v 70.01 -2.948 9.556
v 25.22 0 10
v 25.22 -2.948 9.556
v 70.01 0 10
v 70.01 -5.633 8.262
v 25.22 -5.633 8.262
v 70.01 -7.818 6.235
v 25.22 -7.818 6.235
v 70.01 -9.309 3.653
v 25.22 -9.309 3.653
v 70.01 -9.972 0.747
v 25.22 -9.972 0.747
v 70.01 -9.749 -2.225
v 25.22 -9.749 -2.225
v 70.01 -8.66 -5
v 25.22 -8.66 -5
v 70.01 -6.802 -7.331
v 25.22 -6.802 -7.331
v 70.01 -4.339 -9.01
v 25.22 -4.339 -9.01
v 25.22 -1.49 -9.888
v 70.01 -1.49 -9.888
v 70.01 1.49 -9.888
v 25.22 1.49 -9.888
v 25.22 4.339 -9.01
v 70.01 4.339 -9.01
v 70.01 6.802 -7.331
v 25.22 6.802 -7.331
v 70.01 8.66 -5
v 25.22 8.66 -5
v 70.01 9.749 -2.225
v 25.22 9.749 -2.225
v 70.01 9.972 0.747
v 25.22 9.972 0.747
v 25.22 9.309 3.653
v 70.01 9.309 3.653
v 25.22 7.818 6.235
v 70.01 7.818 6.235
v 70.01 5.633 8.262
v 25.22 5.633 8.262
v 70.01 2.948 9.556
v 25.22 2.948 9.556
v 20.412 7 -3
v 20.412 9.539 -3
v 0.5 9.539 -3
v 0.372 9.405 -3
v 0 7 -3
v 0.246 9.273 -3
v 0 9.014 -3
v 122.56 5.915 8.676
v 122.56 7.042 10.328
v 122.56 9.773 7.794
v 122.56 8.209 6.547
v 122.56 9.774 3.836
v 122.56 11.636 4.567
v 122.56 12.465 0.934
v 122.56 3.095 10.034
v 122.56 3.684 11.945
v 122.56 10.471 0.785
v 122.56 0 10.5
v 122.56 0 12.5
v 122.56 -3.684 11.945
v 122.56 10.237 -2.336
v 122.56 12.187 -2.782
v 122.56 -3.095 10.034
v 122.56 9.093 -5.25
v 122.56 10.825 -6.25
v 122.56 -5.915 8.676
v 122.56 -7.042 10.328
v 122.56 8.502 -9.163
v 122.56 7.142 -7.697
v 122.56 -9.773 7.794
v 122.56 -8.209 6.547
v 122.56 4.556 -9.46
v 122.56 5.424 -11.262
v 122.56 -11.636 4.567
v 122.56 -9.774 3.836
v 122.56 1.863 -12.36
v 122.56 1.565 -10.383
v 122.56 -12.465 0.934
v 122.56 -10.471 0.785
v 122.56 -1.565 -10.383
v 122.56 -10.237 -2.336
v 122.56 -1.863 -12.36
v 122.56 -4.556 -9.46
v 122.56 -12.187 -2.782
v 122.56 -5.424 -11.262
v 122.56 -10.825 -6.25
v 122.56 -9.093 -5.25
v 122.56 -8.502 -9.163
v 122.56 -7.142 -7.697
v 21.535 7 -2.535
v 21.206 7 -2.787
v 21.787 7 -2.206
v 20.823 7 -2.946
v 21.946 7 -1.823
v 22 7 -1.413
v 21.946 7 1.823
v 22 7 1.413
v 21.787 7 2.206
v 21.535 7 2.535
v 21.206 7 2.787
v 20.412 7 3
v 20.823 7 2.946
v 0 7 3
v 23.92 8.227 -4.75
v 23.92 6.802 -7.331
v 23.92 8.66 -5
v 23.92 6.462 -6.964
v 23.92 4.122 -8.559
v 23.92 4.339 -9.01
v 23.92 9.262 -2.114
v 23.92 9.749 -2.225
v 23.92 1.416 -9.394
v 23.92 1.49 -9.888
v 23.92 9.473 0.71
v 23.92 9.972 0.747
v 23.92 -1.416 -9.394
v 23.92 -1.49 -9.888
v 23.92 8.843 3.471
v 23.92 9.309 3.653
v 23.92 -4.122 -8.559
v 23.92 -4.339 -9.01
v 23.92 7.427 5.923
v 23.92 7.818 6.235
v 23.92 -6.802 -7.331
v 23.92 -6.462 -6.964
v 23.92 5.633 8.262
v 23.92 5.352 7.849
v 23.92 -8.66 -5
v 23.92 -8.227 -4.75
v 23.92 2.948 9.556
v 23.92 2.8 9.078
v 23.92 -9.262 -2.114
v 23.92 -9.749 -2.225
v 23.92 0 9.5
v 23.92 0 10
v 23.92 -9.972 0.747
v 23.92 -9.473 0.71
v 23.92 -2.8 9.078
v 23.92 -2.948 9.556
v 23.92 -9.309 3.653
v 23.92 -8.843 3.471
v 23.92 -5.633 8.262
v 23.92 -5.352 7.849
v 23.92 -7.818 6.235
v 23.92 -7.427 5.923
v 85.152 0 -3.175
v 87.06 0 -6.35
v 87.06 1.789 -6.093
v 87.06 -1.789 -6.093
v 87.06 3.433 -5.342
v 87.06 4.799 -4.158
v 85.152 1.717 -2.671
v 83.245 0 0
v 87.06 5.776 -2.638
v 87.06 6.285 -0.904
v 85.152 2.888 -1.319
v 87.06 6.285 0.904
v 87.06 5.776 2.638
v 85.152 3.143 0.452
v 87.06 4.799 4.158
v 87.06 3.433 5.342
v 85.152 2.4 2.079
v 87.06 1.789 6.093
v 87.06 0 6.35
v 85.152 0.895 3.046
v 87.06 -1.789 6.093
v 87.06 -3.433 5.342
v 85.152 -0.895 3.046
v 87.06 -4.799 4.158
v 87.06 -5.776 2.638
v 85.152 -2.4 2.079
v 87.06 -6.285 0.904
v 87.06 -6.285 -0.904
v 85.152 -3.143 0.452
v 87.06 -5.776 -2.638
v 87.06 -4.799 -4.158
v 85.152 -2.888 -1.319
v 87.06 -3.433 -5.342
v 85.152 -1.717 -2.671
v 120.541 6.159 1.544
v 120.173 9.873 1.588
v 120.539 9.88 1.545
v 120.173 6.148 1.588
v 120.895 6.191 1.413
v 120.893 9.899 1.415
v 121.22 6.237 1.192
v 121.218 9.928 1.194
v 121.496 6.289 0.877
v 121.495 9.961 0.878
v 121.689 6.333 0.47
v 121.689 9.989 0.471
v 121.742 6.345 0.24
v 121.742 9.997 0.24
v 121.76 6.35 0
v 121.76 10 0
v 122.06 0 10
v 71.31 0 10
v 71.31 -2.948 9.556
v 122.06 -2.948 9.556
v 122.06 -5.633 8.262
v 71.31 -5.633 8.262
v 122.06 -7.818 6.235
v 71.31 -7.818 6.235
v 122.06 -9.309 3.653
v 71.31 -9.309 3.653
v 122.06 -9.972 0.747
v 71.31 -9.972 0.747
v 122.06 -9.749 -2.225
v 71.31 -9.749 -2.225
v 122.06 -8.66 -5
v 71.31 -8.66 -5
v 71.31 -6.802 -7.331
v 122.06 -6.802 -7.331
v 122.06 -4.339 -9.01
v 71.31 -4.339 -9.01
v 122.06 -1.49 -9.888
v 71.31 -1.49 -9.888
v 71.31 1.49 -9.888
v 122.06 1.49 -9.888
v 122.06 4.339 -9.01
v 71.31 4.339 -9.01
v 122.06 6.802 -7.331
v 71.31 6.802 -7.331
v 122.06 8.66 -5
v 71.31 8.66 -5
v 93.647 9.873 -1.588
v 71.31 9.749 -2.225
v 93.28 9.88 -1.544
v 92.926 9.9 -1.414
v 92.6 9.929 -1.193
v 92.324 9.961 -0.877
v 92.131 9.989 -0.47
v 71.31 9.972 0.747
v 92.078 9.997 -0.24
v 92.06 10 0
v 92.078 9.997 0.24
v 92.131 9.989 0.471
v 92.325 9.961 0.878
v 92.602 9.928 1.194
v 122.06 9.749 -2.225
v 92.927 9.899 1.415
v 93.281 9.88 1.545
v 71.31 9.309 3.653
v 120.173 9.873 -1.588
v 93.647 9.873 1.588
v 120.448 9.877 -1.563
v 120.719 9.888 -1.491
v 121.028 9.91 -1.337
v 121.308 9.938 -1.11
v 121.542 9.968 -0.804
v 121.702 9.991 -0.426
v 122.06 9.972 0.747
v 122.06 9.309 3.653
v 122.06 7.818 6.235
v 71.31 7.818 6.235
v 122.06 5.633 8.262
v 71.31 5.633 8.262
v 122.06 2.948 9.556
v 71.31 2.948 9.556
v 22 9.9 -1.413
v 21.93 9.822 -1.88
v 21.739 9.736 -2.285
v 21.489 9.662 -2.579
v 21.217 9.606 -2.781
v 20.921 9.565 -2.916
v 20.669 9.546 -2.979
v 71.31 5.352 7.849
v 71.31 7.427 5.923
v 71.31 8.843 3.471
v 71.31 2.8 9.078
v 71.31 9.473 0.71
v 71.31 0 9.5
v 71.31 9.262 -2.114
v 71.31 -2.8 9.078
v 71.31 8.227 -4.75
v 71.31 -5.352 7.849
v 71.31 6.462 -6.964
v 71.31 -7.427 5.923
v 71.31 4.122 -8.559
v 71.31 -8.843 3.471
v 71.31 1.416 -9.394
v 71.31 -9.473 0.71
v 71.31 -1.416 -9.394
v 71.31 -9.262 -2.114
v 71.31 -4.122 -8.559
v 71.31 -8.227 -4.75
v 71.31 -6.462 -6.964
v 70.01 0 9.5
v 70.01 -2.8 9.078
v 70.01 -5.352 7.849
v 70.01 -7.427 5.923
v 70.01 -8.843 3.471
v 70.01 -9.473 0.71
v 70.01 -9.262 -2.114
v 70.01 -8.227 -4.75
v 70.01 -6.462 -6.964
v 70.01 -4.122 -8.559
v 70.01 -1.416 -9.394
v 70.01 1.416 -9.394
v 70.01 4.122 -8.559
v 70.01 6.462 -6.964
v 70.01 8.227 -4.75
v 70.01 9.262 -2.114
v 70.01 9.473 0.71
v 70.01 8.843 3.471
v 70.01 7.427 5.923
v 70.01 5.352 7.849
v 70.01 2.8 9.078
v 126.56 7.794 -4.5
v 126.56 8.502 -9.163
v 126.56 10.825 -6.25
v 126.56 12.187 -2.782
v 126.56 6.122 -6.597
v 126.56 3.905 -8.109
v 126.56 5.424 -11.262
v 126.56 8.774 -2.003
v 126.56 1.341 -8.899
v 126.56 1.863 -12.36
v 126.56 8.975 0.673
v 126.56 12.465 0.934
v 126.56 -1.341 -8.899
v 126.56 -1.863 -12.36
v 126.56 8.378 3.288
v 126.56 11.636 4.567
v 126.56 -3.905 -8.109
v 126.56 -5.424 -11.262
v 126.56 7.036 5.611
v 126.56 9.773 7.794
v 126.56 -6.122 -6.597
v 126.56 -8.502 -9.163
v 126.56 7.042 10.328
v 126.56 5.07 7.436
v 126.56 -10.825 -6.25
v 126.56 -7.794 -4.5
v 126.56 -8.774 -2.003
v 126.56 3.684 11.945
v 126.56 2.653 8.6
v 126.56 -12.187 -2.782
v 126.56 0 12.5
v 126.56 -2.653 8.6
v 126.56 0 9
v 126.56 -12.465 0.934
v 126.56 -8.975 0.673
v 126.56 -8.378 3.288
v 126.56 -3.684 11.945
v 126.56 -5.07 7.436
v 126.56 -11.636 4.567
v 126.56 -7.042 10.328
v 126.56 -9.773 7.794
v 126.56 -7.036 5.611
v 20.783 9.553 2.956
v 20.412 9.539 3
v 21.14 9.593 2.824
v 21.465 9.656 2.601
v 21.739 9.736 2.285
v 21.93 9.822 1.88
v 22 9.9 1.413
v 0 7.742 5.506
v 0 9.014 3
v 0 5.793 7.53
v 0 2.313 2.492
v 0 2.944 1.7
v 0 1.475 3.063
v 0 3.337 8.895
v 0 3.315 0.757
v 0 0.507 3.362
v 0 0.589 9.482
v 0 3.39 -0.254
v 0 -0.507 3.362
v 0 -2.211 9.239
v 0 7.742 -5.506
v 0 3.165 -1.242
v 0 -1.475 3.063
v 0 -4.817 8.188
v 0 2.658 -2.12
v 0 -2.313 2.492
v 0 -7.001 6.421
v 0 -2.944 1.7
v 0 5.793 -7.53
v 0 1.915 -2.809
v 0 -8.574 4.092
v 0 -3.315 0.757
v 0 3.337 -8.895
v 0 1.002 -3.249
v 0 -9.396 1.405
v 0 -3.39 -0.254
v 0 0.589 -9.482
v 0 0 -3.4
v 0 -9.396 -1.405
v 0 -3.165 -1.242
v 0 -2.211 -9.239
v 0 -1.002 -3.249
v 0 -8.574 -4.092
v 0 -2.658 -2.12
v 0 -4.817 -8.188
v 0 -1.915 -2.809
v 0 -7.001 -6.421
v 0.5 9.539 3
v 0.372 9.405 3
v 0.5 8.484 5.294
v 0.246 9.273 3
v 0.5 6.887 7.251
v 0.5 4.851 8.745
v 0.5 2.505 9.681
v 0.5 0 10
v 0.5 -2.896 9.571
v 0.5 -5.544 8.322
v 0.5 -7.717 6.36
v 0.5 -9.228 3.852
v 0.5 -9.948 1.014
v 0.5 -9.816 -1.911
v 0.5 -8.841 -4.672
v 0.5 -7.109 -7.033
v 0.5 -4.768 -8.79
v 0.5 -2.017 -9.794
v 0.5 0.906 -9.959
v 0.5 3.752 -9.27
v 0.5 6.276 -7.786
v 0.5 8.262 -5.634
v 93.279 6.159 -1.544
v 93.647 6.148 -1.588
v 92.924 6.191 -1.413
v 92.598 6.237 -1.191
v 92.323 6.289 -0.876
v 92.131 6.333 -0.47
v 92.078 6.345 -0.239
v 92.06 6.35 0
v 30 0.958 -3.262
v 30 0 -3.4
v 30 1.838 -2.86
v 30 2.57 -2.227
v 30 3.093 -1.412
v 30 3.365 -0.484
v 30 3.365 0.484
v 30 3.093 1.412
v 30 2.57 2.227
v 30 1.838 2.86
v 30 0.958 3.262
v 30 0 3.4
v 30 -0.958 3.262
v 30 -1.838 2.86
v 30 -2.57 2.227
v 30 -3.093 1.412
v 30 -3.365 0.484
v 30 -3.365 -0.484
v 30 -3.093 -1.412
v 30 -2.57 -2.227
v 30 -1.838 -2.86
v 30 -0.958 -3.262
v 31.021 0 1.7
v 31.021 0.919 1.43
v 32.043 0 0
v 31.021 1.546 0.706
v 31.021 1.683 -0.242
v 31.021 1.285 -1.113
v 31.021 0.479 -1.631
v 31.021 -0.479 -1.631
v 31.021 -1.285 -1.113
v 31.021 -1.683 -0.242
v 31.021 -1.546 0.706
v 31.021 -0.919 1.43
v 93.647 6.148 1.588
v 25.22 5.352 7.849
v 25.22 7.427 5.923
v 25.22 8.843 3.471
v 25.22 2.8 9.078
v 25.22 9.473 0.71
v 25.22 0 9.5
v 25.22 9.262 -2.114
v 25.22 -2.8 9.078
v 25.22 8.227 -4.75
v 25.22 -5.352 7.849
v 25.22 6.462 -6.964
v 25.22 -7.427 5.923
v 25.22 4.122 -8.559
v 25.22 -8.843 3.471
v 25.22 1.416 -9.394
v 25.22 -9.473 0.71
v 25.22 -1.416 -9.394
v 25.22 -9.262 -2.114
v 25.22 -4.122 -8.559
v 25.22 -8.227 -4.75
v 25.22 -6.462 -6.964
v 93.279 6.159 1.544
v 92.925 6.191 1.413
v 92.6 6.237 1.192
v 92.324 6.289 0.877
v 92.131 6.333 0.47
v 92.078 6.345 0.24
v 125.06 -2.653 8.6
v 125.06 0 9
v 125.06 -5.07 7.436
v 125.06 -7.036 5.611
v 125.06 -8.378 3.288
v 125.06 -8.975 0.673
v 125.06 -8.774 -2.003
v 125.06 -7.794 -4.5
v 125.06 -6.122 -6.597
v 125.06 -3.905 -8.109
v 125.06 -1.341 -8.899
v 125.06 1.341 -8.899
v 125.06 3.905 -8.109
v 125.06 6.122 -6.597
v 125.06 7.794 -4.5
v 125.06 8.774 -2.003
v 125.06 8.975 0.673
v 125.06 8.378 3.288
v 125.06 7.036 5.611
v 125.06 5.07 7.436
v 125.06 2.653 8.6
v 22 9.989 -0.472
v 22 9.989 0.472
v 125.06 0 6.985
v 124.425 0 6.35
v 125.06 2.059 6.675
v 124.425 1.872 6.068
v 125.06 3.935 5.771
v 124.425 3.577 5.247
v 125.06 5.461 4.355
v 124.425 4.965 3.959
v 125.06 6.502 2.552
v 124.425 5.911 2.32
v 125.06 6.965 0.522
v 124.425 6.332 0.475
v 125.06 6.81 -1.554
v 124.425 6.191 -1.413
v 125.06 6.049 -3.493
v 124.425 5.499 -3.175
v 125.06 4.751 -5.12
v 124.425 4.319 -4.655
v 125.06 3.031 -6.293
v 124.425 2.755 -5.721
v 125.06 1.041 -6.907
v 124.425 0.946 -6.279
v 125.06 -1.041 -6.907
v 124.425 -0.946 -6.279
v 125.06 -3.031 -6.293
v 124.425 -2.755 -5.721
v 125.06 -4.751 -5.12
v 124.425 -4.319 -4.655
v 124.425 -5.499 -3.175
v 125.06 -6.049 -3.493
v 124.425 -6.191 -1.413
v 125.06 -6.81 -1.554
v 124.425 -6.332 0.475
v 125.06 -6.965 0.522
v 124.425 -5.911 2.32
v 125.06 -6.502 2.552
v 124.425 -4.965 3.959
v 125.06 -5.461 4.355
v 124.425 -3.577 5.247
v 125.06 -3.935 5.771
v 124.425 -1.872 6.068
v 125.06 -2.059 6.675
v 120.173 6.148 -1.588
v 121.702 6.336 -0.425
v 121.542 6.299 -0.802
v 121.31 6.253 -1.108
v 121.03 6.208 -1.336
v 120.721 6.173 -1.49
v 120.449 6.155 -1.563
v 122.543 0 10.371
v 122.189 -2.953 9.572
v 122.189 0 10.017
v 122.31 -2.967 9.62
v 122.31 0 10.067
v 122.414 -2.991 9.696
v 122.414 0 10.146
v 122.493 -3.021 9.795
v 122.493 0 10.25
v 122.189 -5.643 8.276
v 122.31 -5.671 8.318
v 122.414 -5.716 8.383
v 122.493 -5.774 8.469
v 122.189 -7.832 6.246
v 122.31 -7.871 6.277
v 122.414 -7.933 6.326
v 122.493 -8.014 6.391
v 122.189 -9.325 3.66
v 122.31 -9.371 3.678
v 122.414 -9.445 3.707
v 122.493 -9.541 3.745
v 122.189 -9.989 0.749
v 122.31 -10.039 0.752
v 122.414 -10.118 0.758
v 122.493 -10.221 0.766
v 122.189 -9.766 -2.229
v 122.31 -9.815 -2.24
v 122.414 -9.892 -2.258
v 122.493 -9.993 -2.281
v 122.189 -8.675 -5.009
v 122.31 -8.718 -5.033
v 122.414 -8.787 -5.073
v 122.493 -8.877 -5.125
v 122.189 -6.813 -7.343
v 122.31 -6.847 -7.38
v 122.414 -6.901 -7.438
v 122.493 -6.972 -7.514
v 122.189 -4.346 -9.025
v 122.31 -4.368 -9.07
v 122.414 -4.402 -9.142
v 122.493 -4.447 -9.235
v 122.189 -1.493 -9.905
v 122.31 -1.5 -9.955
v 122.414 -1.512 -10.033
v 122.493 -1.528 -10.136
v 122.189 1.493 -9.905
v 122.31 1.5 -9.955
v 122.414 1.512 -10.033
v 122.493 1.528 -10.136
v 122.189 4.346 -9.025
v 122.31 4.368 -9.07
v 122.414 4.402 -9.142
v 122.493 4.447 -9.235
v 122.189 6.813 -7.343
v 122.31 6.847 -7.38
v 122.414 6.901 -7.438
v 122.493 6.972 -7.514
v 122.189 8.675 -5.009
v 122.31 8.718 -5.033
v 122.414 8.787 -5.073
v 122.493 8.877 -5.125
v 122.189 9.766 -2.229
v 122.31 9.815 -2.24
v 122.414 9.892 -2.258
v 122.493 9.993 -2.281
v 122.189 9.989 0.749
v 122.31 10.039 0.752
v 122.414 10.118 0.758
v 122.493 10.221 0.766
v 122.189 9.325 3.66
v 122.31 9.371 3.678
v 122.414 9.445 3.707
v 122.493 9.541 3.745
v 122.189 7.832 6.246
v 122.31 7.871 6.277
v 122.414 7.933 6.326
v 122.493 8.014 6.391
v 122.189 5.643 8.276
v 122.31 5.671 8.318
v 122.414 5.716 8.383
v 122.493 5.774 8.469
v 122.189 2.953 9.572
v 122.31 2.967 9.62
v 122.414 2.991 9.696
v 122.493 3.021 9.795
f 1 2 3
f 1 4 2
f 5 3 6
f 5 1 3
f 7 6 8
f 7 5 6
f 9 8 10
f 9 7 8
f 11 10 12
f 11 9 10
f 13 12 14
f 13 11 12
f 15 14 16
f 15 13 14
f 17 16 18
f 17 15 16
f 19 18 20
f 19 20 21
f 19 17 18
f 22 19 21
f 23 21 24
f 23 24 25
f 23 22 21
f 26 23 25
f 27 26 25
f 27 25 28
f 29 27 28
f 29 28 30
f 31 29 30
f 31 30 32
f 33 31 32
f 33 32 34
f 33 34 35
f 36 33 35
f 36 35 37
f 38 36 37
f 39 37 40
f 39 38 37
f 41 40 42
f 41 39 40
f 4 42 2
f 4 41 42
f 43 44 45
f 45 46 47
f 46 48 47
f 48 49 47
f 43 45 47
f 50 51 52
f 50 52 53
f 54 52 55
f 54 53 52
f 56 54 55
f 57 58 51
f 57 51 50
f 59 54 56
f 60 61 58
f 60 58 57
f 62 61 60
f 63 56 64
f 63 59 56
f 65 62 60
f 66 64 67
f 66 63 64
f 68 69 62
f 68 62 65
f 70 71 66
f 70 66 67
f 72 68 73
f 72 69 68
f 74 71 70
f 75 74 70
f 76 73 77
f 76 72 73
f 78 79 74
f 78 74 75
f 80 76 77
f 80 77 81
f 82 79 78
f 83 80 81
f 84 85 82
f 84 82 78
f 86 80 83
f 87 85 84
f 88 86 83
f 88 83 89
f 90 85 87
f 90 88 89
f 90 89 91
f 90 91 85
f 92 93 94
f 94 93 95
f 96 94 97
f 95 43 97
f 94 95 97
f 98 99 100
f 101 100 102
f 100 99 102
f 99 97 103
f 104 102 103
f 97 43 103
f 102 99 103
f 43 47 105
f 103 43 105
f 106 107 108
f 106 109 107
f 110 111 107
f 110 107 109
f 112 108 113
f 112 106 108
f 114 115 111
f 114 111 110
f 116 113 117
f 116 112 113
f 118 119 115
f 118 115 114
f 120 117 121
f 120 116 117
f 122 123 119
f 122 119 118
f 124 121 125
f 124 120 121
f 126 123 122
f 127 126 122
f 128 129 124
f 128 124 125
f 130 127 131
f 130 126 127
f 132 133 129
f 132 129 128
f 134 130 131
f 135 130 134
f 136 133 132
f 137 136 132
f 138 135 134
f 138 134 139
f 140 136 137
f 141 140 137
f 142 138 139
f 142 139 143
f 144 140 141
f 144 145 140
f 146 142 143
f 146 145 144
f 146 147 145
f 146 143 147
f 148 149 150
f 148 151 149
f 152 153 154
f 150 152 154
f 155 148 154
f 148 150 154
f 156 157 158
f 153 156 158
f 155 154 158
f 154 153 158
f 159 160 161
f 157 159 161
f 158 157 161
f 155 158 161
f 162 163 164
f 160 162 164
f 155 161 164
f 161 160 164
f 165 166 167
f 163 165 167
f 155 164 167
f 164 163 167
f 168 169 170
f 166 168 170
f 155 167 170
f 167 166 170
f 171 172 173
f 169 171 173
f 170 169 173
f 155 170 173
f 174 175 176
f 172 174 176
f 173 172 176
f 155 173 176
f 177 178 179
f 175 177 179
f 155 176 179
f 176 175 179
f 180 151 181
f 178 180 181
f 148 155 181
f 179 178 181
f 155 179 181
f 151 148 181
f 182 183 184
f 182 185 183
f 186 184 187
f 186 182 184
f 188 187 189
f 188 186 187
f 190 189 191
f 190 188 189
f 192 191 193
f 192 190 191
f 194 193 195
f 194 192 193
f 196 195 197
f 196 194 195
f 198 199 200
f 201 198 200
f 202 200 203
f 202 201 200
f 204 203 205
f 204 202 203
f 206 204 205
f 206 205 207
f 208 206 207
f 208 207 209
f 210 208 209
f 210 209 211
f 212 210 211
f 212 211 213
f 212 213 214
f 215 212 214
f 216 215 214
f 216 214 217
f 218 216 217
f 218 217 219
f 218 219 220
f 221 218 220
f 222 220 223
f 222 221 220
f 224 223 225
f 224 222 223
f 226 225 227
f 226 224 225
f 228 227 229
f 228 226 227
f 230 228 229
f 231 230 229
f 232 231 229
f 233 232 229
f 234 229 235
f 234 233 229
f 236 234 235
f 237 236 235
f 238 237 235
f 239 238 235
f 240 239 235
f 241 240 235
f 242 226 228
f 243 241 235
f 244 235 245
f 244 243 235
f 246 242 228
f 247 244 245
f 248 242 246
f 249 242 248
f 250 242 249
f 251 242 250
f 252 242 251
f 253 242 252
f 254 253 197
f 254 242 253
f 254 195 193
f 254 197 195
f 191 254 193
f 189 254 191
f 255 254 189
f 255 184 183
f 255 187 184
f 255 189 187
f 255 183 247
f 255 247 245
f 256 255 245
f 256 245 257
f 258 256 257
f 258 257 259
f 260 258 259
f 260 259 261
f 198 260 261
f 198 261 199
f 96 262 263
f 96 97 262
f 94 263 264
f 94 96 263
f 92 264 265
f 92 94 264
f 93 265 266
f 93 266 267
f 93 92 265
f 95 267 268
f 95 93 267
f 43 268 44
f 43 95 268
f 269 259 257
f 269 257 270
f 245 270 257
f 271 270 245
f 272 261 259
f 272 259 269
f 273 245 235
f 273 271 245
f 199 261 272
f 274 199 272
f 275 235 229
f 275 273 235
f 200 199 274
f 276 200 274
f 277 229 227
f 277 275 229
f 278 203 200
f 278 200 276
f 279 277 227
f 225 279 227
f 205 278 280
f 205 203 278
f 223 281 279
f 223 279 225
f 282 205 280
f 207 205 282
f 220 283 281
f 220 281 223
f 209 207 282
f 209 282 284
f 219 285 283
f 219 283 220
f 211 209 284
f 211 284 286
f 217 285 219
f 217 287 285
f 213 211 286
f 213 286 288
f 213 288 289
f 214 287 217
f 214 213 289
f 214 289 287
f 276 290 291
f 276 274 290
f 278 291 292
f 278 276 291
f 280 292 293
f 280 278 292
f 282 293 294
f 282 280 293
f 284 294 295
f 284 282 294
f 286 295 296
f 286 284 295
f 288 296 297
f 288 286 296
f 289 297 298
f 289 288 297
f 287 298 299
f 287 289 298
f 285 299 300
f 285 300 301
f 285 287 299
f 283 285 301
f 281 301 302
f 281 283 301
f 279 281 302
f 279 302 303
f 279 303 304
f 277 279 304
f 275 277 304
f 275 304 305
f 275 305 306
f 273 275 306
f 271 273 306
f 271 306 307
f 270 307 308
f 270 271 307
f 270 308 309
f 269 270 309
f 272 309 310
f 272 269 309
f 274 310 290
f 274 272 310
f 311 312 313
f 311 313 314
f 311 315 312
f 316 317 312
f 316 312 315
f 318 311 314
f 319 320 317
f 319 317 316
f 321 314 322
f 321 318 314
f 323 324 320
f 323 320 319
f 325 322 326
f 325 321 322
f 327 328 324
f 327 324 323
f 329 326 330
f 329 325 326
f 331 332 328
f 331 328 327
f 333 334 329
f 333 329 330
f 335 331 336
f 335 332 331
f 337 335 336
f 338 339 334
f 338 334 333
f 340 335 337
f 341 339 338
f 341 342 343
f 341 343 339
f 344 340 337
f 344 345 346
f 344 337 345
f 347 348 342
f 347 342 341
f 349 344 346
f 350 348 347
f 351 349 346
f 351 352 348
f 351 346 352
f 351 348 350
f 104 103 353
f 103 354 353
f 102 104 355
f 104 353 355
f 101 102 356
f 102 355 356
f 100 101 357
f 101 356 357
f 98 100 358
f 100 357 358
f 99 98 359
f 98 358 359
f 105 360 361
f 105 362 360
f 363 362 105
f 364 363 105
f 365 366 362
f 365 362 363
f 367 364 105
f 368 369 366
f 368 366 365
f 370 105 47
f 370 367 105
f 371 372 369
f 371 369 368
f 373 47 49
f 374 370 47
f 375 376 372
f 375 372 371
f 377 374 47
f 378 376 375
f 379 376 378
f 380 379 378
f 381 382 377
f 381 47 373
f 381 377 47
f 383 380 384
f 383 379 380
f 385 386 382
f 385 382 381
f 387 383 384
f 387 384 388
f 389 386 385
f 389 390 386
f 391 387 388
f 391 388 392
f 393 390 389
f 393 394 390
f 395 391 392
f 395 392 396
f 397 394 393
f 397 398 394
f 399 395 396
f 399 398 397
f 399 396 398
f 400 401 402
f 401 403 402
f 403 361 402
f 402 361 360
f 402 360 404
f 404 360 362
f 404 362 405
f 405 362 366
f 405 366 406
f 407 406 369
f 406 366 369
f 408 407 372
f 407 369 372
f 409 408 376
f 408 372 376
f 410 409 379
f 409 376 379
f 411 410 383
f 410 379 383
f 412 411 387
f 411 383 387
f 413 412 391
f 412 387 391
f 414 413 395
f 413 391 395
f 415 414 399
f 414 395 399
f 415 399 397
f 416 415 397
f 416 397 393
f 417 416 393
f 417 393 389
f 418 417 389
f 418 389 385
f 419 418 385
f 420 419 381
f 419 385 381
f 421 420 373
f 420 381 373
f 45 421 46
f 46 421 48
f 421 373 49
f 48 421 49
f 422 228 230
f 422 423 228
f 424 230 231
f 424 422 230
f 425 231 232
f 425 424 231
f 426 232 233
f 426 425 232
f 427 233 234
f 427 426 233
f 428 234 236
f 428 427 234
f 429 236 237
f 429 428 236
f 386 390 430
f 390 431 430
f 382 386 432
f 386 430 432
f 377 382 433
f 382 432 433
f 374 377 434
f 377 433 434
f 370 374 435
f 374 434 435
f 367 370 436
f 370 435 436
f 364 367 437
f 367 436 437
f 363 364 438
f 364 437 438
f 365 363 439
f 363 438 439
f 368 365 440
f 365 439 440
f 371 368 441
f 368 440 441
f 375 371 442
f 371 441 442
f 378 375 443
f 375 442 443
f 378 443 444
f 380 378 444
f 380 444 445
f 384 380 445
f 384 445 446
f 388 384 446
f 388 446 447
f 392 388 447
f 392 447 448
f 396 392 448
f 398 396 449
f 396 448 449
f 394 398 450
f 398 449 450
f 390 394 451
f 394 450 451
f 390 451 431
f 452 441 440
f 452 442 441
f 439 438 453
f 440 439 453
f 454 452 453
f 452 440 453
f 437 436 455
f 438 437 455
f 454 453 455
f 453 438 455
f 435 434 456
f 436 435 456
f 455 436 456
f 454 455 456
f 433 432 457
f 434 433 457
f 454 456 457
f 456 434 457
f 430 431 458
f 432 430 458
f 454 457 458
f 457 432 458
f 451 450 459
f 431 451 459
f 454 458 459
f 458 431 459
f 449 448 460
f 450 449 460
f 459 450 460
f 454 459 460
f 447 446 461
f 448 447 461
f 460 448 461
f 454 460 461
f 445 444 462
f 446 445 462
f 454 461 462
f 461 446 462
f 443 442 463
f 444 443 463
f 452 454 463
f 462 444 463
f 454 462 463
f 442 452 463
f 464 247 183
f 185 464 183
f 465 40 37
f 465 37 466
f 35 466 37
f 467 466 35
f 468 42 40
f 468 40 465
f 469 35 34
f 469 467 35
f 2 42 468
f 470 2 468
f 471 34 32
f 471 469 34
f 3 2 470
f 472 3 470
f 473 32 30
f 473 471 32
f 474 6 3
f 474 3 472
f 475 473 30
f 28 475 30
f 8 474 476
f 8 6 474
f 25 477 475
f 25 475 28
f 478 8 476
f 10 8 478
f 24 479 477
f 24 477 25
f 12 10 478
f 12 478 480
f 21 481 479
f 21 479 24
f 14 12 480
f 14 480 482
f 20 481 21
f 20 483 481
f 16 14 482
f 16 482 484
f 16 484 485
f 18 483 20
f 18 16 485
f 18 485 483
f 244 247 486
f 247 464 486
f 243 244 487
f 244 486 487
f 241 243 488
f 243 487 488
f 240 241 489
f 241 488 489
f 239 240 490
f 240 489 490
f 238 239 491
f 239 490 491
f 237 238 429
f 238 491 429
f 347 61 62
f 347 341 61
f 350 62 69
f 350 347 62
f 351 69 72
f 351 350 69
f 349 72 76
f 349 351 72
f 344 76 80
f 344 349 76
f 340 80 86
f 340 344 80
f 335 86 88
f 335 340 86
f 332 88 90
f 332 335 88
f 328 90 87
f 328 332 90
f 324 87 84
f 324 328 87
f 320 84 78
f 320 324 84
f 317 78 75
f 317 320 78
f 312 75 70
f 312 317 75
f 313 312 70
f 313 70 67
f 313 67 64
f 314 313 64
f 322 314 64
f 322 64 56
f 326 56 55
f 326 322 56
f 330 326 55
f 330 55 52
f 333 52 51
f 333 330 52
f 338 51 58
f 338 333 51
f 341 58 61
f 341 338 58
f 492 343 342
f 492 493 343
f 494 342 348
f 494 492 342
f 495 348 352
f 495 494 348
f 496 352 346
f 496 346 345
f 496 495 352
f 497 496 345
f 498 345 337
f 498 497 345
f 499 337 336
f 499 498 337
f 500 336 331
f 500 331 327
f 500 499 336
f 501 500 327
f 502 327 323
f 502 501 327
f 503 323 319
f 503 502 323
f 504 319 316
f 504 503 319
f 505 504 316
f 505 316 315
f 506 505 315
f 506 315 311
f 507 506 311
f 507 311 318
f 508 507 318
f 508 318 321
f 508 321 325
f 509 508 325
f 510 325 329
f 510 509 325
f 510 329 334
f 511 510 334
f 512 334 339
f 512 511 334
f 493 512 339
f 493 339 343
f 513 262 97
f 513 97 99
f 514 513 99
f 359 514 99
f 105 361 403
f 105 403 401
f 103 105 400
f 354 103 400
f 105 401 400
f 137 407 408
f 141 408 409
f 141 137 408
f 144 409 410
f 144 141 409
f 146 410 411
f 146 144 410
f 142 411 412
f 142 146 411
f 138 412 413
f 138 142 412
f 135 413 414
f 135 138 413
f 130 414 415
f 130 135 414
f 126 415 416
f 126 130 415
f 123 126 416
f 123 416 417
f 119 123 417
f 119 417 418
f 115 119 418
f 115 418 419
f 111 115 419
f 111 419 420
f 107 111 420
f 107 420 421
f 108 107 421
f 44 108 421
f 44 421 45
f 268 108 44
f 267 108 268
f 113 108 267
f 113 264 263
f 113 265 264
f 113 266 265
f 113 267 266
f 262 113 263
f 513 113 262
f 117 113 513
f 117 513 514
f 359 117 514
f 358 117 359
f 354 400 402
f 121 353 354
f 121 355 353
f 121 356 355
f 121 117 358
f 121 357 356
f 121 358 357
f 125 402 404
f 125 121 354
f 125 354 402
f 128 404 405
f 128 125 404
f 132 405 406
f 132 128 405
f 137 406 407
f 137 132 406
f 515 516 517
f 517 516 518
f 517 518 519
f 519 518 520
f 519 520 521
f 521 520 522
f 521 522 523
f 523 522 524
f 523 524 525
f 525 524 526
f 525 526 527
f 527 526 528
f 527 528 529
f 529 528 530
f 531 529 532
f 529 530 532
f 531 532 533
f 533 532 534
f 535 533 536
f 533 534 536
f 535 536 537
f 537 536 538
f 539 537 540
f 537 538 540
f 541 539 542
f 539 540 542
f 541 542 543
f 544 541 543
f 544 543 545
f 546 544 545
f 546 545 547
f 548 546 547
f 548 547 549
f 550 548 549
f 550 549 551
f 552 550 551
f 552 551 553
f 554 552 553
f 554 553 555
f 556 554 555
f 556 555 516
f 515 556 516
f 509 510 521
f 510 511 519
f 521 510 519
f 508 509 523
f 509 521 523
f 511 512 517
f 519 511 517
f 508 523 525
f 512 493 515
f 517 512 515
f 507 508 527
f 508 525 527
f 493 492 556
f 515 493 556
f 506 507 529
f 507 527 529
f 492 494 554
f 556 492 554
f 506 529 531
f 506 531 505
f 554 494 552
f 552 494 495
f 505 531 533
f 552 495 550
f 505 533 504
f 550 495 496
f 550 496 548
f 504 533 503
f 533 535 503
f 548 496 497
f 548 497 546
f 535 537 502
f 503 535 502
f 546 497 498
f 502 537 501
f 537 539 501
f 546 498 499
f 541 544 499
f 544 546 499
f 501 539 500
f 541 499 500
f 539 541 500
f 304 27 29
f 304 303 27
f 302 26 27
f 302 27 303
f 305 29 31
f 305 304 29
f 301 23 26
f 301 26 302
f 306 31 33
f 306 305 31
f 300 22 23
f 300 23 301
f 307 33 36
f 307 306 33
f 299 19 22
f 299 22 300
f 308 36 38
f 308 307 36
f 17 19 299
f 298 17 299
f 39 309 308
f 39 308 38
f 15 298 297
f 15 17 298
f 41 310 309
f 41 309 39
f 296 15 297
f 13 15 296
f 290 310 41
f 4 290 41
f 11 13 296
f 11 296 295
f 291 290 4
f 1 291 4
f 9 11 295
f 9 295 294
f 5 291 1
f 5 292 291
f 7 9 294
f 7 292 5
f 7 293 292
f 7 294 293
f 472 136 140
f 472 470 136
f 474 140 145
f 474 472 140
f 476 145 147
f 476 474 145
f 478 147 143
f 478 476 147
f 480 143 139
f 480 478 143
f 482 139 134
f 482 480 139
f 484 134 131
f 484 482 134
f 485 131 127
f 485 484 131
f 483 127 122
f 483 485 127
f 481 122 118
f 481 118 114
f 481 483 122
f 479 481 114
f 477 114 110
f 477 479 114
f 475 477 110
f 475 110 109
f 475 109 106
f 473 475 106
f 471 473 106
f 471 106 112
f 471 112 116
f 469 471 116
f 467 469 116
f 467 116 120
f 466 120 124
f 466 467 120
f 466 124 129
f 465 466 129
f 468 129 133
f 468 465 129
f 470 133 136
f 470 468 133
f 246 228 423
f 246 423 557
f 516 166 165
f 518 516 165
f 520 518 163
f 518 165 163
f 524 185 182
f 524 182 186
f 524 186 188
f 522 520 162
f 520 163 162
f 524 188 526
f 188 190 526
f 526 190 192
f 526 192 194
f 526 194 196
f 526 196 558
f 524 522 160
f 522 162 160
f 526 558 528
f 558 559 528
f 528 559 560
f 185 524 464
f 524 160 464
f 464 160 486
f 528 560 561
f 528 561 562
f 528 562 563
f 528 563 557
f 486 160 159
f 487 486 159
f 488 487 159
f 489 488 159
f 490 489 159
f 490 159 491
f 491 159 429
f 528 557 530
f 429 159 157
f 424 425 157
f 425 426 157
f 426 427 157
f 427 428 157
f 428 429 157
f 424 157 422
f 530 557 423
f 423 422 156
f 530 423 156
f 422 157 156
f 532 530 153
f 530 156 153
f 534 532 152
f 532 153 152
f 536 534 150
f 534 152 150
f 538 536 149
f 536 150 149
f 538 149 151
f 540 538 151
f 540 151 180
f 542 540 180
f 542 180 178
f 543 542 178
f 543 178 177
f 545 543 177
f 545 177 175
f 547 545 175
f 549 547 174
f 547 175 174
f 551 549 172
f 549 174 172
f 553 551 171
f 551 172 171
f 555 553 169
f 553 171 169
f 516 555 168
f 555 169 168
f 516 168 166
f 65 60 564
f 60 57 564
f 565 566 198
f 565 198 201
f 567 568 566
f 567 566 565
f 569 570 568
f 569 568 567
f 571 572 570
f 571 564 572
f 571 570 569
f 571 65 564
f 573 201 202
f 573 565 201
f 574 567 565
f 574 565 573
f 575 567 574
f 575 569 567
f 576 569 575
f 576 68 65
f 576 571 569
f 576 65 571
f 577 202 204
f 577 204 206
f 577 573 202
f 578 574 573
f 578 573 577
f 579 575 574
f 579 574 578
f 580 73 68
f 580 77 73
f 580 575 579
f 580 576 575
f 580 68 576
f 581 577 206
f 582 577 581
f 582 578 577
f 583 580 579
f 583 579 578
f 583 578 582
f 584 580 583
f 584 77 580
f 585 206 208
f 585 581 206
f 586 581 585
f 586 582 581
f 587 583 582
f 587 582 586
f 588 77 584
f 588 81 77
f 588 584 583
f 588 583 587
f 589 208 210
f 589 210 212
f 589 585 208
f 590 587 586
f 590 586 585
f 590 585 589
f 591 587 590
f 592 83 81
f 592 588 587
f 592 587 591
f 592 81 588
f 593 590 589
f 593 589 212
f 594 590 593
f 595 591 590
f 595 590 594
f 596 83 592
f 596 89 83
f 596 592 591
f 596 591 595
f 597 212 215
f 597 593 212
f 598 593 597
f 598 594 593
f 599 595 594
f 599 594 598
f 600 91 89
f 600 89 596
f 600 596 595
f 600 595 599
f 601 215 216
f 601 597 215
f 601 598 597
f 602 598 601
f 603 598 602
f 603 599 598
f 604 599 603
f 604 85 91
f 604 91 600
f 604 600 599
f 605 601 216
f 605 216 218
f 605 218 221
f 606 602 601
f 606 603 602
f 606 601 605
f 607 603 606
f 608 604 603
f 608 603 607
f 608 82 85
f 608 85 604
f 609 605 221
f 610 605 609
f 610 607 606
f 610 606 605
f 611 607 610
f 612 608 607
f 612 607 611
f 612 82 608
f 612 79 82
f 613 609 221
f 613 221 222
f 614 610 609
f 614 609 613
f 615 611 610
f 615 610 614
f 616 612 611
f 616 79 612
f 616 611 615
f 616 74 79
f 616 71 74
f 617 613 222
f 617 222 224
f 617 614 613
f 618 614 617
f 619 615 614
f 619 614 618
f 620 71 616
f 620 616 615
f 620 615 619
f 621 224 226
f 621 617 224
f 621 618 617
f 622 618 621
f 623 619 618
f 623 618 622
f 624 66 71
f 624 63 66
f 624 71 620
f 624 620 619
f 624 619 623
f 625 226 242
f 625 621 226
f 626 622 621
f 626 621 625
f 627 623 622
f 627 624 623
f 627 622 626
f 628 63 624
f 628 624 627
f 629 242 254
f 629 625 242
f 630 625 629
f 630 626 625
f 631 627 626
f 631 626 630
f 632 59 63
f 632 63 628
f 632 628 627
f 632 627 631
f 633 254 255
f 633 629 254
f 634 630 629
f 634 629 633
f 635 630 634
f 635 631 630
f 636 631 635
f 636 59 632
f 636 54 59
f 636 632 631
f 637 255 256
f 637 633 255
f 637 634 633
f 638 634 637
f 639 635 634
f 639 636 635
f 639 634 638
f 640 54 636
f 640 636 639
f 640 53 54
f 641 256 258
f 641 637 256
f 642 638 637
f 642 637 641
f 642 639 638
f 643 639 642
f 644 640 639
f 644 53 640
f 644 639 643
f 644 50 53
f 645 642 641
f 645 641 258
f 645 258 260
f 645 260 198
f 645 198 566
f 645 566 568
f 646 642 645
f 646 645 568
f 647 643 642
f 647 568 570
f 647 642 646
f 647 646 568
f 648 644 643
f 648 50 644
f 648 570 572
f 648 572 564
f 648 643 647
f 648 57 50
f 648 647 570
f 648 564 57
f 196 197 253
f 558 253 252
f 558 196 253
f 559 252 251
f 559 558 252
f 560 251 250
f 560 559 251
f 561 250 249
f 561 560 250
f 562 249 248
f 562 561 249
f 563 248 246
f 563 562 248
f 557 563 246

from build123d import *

# Parameters (mm, degrees)
F_1_2_0_5_DIAMETER_HOLE1_D           = 12.7
F_1_2_0_5_DIAMETER_HOLE1_DEPTH       = 38
F_1_2_0_5_DIAMETER_HOLE1_CSINK_D     = 13.97
F_1_2_0_5_DIAMETER_HOLE1_CSINK_ANGLE = 90
F_1_2_0_5_DIAMETER_HOLE1_TIP         = 3.815464931
FILLET1_R                            = 0.5
CUT_EXTRUDE2_DEPTH                   = 22
FILLET2_R                            = 1.5875
CHAMFER2_SIZE                        = 0.5
M8X1_25_TAPPED_HOLE1_D               = 6.8
M8X1_25_TAPPED_HOLE1_DEPTH           = 30
M8X1_25_TAPPED_HOLE1_TIP             = 2.042926105
CUT_EXTRUDE3_REACH                   = 131.151
CUT_EXTRUDE3_END_RADIUS              = 6.35
SKETCH9_W                            = 29.7
SKETCH9_H                            = 3.175
FILLET4_R                            = 1.5875


with BuildPart() as part:
    # Sketch1 → Revolve1 (revolve)
    with BuildSketch(Plane.XY, mode=Mode.PRIVATE) as revolve1_sk:
        Polygon((0, 0), (0, 10), (23.92, 10), (23.92, 9.5), (25.22, 9.5), (25.22, 10), (70.01, 10), (70.01, 9.5), (71.31, 9.5), (71.31, 10), (122.56, 10), (122.56, 12.5), (126.56, 12.5), (126.56, 9), (125.06, 9), (125.06, 6.375), (125.06, 0), (87.56, 0), align=None)
    revolve(revolve1_sk.sketch.rotate(Axis((-9.141012775, 0, 0), (1, 0, 0)), 90), axis=Axis((-9.141012775, 0, 0), (1, 0, 0)))

    # 1/2 (0.5) Diameter Hole1
    with Locations(Plane(origin=(125.06, 0, 0), x_dir=(0, 0, -1), z_dir=(1, 0, 0))):
        with Locations((0, 0)):
            CounterSinkHole(F_1_2_0_5_DIAMETER_HOLE1_D / 2, F_1_2_0_5_DIAMETER_HOLE1_CSINK_D / 2, depth=F_1_2_0_5_DIAMETER_HOLE1_DEPTH, counter_sink_angle=F_1_2_0_5_DIAMETER_HOLE1_CSINK_ANGLE)
            with Locations((0, 0, -(F_1_2_0_5_DIAMETER_HOLE1_DEPTH + F_1_2_0_5_DIAMETER_HOLE1_TIP / 2))):  # 118° drill point
                Cone(0, F_1_2_0_5_DIAMETER_HOLE1_D / 2, F_1_2_0_5_DIAMETER_HOLE1_TIP, mode=Mode.SUBTRACT)

    # Fillet1
    fillet1_edges = [part.edges().sort_by_distance(p)[0] for p in [
        (122.56, 0, -10),
    ]]
    fillet(fillet1_edges, radius=FILLET1_R)

    # Sketch6 → Cut-Extrude2 (cut)
    with BuildSketch(Plane.ZY):
        Polygon((-3, 73.427602241), (-3, 9.539392014), (-3, 7), (3, 7), (3, 9.539392014), (3, 73.427602241), (3, 201.204022694), (-3, 201.204022694), align=None)
    extrude(amount=-CUT_EXTRUDE2_DEPTH, mode=Mode.SUBTRACT)

    # Fillet2
    fillet2_edges = [part.edges().sort_by_distance(p)[0] for p in [
        (22, 8.269696007, -3),
        (22, 8.269696007, 3),
    ]]
    fillet(fillet2_edges, radius=FILLET2_R)

    # Chamfer2
    chamfer2_edges = [part.edges().sort_by_distance(p)[0] for p in [
        (0, -8.062257748, -5.916079783),
    ]]
    chamfer(chamfer2_edges, length=CHAMFER2_SIZE)

    # M8x1.25 Tapped Hole1
    with Locations(Plane.ZY):
        with Locations((0, 0)):
            Hole(M8X1_25_TAPPED_HOLE1_D / 2, depth=M8X1_25_TAPPED_HOLE1_DEPTH)
            with Locations((0, 0, -(M8X1_25_TAPPED_HOLE1_DEPTH + M8X1_25_TAPPED_HOLE1_TIP / 2))):  # 118° drill point
                Cone(0, M8X1_25_TAPPED_HOLE1_D / 2, M8X1_25_TAPPED_HOLE1_TIP, mode=Mode.SUBTRACT)

    # Cut-Extrude3: up to this cylinder (the profile starts outside it)
    cut_extrude3_end = Plane(origin=(106.91, 0, 0), z_dir=(1, 0, 0)) * Cylinder(CUT_EXTRUDE3_END_RADIUS, 276.002, mode=Mode.PRIVATE)
    # Sketch9 → Cut-Extrude3 (cut, up to the surface)
    with BuildSketch(Plane(origin=(0, 10, 0), x_dir=(1, 0, 0), z_dir=(0, 1, 0)), mode=Mode.PRIVATE) as cut_extrude3_sk1:
        with Locations((106.91, 0)):
            Rectangle(SKETCH9_W, SKETCH9_H)
    cut_extrude3_tool1 = extrude(cut_extrude3_sk1.sketch, amount=-CUT_EXTRUDE3_REACH, mode=Mode.PRIVATE) - cut_extrude3_end
    add(cut_extrude3_tool1.solids().sort_by_distance((106.91, 10, 0))[0], mode=Mode.SUBTRACT)

    # Fillet4
    fillet4_edges = [part.edges().sort_by_distance(p)[0] for p in [
        (92.06, 8.010774594, 1.5875),
        (121.76, 8.010774594, 1.5875),
        (121.76, 8.010774594, -1.5875),
        (92.06, 8.010774594, -1.5875),
    ]]
    fillet(fillet4_edges, radius=FILLET4_R - 0.0001)  # a hair under: the kernel refuses the full size


solid = part.part
